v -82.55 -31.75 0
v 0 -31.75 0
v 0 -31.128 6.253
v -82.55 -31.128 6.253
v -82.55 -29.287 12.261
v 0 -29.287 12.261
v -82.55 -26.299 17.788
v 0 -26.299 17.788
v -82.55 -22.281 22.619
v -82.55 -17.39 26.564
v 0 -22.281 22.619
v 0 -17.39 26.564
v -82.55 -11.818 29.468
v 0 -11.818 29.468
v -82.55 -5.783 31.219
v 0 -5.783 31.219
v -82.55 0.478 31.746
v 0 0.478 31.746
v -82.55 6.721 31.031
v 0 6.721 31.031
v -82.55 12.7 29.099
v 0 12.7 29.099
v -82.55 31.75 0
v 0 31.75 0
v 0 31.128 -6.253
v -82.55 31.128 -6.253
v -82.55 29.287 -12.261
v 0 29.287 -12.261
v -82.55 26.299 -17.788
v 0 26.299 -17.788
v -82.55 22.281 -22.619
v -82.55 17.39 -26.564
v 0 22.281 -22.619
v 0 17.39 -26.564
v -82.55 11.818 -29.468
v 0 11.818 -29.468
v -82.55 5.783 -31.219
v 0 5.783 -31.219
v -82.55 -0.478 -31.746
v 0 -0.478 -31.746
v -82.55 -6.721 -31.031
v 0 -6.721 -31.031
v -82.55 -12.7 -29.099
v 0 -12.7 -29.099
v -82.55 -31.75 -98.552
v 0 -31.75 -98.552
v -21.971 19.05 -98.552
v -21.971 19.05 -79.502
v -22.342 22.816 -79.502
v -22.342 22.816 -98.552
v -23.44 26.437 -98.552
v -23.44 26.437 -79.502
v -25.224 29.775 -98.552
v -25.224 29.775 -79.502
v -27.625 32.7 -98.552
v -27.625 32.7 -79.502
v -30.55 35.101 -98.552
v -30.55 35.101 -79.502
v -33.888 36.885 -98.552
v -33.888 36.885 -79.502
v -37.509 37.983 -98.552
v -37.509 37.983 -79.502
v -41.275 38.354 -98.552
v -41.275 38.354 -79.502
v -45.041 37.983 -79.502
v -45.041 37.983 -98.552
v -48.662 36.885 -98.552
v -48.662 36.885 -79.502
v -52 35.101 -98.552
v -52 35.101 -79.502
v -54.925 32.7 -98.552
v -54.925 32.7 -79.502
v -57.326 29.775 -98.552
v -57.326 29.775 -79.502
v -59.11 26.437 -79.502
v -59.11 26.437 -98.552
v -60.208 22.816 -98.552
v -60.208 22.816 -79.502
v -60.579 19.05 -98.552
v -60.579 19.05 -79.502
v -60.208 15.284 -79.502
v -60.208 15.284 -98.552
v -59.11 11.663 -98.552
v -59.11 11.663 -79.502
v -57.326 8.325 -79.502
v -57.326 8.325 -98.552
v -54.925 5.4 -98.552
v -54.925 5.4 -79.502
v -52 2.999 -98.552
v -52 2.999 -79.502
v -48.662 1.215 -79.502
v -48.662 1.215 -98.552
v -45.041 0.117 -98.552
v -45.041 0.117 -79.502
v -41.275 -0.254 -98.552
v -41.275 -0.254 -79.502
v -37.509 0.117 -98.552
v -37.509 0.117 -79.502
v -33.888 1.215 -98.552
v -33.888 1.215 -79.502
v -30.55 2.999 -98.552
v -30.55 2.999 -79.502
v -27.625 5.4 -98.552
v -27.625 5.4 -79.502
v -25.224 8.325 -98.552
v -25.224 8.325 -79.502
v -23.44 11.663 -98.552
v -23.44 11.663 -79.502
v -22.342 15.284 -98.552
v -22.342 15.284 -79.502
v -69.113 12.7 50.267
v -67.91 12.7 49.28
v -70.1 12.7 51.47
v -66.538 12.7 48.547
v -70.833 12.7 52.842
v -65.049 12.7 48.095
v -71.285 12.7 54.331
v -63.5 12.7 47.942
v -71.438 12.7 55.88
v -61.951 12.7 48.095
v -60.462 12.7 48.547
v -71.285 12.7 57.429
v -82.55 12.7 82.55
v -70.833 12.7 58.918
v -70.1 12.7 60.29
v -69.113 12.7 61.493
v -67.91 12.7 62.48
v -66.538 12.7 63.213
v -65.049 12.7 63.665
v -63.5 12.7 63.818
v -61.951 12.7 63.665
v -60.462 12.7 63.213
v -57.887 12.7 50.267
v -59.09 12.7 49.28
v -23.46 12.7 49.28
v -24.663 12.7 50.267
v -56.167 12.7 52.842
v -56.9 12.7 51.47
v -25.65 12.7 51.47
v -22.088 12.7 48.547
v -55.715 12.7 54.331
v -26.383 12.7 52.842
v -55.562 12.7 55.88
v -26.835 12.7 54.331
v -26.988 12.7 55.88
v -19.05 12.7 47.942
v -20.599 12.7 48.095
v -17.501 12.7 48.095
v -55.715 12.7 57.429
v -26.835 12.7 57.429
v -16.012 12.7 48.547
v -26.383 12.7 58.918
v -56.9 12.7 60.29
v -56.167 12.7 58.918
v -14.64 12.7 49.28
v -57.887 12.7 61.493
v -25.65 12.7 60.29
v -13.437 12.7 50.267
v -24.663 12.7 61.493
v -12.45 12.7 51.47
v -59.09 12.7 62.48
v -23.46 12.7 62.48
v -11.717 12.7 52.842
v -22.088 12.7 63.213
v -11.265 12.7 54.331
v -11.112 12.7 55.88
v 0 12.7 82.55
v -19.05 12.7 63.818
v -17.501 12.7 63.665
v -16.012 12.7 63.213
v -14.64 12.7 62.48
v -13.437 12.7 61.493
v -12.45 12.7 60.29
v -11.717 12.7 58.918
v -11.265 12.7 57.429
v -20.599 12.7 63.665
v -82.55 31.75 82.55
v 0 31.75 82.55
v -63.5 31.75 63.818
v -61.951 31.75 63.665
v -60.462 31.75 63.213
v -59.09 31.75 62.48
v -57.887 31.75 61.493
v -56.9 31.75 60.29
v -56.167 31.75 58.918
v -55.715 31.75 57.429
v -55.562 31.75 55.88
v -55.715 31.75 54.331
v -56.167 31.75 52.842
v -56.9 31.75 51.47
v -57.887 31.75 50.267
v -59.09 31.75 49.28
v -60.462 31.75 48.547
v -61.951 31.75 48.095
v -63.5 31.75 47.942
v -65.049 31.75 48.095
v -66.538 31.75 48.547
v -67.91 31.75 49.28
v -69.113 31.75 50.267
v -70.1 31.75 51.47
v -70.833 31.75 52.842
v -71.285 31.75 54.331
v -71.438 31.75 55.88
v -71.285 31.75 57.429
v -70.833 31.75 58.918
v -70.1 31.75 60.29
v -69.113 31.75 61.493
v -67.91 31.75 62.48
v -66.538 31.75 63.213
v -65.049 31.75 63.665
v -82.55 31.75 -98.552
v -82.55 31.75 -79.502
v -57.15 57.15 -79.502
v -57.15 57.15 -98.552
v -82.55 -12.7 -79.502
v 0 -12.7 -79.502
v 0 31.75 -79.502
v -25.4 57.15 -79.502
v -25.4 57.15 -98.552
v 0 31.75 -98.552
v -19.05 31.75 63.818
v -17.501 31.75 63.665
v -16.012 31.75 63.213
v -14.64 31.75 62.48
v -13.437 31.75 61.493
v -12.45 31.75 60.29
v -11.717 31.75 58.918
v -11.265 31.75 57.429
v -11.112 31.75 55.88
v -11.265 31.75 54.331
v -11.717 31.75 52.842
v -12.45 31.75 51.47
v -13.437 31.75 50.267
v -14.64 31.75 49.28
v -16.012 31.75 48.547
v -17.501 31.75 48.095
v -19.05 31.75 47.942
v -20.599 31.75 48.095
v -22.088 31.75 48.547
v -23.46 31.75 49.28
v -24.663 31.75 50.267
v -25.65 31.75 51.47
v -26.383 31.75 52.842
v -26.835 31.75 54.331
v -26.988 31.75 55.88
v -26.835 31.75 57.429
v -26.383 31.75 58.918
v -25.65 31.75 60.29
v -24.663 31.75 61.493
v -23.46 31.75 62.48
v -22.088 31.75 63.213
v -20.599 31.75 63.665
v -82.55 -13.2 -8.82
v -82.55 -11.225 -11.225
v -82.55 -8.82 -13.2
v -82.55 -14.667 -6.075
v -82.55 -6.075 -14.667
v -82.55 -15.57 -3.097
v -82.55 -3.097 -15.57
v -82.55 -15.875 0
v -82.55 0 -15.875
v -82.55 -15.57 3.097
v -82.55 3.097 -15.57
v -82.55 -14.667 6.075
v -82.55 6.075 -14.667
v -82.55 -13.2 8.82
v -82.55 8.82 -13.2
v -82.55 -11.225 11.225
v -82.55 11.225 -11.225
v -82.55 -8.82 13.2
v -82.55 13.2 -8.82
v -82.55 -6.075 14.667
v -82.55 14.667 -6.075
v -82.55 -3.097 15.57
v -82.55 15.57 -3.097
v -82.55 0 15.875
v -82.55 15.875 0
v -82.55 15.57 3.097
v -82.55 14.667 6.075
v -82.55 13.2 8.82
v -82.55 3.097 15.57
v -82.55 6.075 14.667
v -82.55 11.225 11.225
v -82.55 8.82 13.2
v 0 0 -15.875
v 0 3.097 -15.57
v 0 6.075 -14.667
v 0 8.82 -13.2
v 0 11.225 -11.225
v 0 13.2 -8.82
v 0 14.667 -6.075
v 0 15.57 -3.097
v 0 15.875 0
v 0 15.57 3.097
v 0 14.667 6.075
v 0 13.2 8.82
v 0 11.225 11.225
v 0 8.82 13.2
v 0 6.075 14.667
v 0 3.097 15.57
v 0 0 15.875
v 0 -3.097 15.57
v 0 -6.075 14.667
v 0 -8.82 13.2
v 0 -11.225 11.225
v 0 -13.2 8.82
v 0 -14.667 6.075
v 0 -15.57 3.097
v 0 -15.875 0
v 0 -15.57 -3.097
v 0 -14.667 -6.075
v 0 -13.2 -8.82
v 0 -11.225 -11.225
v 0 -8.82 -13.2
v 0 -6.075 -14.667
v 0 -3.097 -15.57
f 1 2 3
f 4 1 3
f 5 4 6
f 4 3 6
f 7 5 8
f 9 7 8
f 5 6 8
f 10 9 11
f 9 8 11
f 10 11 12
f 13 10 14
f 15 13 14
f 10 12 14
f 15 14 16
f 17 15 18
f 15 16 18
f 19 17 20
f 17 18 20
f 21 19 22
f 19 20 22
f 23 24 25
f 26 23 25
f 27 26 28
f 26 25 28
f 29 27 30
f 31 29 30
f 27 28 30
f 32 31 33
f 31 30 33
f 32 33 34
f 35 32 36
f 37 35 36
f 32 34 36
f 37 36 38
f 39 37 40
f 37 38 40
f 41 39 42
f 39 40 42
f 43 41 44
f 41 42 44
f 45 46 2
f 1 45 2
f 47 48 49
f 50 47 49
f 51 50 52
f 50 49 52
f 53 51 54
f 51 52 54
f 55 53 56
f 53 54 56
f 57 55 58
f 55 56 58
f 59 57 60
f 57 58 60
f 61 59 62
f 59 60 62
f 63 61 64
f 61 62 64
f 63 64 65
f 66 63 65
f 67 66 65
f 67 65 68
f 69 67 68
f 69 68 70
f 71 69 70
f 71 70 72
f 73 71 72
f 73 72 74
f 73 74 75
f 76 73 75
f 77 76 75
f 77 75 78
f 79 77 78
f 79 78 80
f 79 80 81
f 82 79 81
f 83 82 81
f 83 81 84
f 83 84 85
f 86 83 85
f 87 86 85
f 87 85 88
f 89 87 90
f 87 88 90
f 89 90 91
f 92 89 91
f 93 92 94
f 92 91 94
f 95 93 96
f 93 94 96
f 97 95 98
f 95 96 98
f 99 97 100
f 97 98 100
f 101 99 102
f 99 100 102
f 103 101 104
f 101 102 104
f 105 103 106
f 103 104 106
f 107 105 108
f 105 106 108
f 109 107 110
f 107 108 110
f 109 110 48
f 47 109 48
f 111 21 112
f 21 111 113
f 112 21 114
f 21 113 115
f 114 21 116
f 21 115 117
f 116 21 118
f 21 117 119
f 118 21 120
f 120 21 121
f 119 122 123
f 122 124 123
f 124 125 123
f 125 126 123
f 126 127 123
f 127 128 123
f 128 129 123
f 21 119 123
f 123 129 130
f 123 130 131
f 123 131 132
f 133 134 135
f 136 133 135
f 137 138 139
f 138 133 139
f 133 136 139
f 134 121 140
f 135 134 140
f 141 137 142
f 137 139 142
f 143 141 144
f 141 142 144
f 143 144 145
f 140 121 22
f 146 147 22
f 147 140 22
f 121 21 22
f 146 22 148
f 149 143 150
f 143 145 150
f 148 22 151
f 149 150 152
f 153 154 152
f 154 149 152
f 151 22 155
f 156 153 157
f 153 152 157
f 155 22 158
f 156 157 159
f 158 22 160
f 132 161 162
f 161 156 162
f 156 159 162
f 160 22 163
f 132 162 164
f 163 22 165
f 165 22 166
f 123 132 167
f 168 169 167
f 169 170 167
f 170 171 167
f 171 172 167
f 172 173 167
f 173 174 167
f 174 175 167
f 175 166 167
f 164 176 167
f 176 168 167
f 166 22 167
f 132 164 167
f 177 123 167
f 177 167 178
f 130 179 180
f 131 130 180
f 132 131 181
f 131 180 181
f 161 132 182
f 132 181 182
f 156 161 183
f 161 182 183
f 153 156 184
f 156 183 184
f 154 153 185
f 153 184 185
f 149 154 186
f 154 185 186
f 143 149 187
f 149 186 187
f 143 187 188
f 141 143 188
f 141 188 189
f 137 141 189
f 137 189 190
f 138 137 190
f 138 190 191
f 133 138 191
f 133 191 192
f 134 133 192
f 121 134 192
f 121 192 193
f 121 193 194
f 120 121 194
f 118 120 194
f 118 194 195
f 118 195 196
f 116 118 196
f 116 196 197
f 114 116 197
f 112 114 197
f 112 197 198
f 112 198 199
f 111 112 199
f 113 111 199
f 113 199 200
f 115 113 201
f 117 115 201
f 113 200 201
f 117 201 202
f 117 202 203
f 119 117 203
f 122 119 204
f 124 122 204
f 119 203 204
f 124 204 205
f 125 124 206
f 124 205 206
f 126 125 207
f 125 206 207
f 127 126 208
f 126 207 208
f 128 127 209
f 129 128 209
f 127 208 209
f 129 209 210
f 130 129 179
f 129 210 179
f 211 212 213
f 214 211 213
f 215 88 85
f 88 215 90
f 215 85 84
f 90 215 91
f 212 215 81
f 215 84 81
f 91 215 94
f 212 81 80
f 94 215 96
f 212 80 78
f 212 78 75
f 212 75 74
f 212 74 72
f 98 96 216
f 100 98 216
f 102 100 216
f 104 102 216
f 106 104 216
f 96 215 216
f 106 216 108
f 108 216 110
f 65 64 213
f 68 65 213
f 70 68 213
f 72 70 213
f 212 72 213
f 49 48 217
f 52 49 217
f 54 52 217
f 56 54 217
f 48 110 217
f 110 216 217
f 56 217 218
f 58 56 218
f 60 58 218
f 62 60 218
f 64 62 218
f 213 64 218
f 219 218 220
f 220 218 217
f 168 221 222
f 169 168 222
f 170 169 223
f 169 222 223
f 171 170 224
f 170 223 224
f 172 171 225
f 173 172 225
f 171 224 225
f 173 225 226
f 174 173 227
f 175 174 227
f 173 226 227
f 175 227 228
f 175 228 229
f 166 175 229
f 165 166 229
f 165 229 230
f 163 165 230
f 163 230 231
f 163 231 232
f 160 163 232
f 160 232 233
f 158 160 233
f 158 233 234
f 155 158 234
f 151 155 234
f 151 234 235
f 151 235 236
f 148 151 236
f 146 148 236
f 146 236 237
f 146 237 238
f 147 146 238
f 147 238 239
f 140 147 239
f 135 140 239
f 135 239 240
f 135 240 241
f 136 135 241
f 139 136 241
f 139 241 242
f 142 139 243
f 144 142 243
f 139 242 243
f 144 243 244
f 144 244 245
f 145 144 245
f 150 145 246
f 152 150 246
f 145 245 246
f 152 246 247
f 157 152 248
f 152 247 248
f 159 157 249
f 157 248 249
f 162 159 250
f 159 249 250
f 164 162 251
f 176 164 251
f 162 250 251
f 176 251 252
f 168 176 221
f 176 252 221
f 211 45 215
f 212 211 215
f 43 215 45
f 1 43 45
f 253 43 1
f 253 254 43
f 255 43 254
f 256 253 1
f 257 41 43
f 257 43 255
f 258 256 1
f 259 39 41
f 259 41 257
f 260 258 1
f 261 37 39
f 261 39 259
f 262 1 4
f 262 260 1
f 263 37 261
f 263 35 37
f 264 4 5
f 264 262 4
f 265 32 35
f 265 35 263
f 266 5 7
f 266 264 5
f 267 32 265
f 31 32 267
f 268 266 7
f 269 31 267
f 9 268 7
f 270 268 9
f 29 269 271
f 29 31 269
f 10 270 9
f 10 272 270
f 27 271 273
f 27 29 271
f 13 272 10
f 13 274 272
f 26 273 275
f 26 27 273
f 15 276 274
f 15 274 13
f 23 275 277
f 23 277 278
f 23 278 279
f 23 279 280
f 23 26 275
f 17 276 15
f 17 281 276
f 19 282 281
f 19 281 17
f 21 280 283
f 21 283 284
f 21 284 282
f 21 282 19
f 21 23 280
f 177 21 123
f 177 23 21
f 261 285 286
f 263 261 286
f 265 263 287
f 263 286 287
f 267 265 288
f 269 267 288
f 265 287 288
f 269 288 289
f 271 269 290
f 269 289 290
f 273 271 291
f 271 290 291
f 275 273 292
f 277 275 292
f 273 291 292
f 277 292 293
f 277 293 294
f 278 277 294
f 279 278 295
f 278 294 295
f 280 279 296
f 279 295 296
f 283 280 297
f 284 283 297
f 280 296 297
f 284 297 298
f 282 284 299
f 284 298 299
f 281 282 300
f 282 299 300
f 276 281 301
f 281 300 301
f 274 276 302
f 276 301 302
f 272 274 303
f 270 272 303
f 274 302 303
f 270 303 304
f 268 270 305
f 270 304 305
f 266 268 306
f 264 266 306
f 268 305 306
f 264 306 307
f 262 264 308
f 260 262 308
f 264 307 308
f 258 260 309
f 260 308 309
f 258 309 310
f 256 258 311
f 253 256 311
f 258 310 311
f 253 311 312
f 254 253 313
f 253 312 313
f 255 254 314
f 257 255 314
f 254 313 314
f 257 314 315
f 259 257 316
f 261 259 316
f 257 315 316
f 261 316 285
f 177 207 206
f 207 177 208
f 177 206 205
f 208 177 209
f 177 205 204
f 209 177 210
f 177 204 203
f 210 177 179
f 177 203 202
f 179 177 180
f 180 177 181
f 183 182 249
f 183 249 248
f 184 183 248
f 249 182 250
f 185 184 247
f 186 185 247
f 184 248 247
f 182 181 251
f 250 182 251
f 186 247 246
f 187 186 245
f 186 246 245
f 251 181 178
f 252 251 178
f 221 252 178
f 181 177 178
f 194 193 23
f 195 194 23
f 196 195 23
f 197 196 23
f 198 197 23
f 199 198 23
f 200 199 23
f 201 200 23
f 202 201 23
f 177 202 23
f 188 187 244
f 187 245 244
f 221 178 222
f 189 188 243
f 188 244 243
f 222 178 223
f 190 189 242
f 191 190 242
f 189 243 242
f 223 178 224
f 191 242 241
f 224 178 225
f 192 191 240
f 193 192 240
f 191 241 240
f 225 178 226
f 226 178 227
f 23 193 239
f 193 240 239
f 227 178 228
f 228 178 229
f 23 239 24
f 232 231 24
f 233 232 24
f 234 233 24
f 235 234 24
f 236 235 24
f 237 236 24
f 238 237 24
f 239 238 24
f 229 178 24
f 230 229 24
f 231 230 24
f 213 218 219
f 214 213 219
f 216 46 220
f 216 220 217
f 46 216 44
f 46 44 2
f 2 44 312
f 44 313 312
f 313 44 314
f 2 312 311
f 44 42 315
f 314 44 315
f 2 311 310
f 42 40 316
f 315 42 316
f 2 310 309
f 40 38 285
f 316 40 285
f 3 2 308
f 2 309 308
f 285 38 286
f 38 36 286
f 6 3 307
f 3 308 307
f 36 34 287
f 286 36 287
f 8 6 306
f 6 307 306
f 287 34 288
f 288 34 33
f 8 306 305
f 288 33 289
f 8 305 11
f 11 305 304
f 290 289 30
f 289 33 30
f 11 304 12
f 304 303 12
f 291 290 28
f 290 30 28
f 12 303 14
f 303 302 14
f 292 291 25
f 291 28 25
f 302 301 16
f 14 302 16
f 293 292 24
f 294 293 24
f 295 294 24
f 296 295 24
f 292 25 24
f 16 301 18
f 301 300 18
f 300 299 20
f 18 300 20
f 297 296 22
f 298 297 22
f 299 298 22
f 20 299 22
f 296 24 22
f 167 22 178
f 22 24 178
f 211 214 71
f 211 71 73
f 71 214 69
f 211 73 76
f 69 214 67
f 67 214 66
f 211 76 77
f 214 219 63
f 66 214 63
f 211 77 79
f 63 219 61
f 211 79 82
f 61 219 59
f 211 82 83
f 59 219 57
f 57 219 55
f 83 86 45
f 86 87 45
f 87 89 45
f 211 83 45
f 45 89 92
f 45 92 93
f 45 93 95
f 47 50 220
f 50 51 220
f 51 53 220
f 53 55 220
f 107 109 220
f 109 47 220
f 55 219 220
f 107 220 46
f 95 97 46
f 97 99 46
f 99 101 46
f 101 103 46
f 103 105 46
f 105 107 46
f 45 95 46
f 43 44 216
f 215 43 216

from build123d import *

# Parameters (mm, degrees)
SKETCH2_R           = 15.875
BOSS_EXTRUDE1_DEPTH = 82.55
SKETCH4_R           = 7.9375
CUT_EXTRUDE1_DEPTH  = 144.384968543
SKETCH5_R           = 19.304
CUT_EXTRUDE2_DEPTH  = 191.634403254


with BuildPart() as part:
    # Sketch2 → Boss-Extrude1 (new body)
    with BuildSketch(Plane(origin=(0, 0, 0), x_dir=(0, 0, -1), z_dir=(1, 0, 0))):
        with BuildLine():
            ThreePointArc((0, -31.75), (-26.563955842, -17.390191201), (-29.099355663, 12.7))
            Line((-29.099355663, 12.7), (-82.55, 12.7))
            Line((-82.55, 12.7), (-82.55, 31.75))
            Line((-82.55, 31.75), (0, 31.75))
            ThreePointArc((0, 31.75), (26.563955842, 17.390191201), (29.099355663, -12.7))
            Line((29.099355663, -12.7), (79.502, -12.7))
            Line((79.502, -12.7), (79.502, 57.15))
            Line((79.502, 57.15), (98.552, 57.15))
            Line((98.552, 57.15), (98.552, -31.75))
            Line((98.552, -31.75), (0, -31.75))
        make_face()
        Circle(SKETCH2_R, mode=Mode.SUBTRACT)
    extrude(amount=-BOSS_EXTRUDE1_DEPTH)

    # Sketch4 → Cut-Extrude1 (cut, through all)
    with BuildSketch(Plane(origin=(0, 31.75, 0), x_dir=(1, 0, 0), z_dir=(0, 1, 0))):
        with Locations(Location((-63.5, -55.88, 0), (0, 0, 270))):
            Circle(SKETCH4_R)
        with Locations(Location((-19.05, -55.88, 0), (0, 0, 270))):
            Circle(SKETCH4_R)
    extrude(amount=-CUT_EXTRUDE1_DEPTH, mode=Mode.SUBTRACT)

    # Sketch5 → Cut-Extrude2 (cut, through all)
    with BuildSketch(Plane.XY.offset(-79.502)):
        Polygon((-82.55, 31.75), (-57.15, 57.15), (-82.55, 57.15), align=None)
        Polygon((-25.4, 57.15), (0, 31.75), (0, 57.15), align=None)
        with Locations((-41.275, 19.05)):
            Circle(SKETCH5_R)
    extrude(amount=-CUT_EXTRUDE2_DEPTH, mode=Mode.SUBTRACT)


solid = part.part
